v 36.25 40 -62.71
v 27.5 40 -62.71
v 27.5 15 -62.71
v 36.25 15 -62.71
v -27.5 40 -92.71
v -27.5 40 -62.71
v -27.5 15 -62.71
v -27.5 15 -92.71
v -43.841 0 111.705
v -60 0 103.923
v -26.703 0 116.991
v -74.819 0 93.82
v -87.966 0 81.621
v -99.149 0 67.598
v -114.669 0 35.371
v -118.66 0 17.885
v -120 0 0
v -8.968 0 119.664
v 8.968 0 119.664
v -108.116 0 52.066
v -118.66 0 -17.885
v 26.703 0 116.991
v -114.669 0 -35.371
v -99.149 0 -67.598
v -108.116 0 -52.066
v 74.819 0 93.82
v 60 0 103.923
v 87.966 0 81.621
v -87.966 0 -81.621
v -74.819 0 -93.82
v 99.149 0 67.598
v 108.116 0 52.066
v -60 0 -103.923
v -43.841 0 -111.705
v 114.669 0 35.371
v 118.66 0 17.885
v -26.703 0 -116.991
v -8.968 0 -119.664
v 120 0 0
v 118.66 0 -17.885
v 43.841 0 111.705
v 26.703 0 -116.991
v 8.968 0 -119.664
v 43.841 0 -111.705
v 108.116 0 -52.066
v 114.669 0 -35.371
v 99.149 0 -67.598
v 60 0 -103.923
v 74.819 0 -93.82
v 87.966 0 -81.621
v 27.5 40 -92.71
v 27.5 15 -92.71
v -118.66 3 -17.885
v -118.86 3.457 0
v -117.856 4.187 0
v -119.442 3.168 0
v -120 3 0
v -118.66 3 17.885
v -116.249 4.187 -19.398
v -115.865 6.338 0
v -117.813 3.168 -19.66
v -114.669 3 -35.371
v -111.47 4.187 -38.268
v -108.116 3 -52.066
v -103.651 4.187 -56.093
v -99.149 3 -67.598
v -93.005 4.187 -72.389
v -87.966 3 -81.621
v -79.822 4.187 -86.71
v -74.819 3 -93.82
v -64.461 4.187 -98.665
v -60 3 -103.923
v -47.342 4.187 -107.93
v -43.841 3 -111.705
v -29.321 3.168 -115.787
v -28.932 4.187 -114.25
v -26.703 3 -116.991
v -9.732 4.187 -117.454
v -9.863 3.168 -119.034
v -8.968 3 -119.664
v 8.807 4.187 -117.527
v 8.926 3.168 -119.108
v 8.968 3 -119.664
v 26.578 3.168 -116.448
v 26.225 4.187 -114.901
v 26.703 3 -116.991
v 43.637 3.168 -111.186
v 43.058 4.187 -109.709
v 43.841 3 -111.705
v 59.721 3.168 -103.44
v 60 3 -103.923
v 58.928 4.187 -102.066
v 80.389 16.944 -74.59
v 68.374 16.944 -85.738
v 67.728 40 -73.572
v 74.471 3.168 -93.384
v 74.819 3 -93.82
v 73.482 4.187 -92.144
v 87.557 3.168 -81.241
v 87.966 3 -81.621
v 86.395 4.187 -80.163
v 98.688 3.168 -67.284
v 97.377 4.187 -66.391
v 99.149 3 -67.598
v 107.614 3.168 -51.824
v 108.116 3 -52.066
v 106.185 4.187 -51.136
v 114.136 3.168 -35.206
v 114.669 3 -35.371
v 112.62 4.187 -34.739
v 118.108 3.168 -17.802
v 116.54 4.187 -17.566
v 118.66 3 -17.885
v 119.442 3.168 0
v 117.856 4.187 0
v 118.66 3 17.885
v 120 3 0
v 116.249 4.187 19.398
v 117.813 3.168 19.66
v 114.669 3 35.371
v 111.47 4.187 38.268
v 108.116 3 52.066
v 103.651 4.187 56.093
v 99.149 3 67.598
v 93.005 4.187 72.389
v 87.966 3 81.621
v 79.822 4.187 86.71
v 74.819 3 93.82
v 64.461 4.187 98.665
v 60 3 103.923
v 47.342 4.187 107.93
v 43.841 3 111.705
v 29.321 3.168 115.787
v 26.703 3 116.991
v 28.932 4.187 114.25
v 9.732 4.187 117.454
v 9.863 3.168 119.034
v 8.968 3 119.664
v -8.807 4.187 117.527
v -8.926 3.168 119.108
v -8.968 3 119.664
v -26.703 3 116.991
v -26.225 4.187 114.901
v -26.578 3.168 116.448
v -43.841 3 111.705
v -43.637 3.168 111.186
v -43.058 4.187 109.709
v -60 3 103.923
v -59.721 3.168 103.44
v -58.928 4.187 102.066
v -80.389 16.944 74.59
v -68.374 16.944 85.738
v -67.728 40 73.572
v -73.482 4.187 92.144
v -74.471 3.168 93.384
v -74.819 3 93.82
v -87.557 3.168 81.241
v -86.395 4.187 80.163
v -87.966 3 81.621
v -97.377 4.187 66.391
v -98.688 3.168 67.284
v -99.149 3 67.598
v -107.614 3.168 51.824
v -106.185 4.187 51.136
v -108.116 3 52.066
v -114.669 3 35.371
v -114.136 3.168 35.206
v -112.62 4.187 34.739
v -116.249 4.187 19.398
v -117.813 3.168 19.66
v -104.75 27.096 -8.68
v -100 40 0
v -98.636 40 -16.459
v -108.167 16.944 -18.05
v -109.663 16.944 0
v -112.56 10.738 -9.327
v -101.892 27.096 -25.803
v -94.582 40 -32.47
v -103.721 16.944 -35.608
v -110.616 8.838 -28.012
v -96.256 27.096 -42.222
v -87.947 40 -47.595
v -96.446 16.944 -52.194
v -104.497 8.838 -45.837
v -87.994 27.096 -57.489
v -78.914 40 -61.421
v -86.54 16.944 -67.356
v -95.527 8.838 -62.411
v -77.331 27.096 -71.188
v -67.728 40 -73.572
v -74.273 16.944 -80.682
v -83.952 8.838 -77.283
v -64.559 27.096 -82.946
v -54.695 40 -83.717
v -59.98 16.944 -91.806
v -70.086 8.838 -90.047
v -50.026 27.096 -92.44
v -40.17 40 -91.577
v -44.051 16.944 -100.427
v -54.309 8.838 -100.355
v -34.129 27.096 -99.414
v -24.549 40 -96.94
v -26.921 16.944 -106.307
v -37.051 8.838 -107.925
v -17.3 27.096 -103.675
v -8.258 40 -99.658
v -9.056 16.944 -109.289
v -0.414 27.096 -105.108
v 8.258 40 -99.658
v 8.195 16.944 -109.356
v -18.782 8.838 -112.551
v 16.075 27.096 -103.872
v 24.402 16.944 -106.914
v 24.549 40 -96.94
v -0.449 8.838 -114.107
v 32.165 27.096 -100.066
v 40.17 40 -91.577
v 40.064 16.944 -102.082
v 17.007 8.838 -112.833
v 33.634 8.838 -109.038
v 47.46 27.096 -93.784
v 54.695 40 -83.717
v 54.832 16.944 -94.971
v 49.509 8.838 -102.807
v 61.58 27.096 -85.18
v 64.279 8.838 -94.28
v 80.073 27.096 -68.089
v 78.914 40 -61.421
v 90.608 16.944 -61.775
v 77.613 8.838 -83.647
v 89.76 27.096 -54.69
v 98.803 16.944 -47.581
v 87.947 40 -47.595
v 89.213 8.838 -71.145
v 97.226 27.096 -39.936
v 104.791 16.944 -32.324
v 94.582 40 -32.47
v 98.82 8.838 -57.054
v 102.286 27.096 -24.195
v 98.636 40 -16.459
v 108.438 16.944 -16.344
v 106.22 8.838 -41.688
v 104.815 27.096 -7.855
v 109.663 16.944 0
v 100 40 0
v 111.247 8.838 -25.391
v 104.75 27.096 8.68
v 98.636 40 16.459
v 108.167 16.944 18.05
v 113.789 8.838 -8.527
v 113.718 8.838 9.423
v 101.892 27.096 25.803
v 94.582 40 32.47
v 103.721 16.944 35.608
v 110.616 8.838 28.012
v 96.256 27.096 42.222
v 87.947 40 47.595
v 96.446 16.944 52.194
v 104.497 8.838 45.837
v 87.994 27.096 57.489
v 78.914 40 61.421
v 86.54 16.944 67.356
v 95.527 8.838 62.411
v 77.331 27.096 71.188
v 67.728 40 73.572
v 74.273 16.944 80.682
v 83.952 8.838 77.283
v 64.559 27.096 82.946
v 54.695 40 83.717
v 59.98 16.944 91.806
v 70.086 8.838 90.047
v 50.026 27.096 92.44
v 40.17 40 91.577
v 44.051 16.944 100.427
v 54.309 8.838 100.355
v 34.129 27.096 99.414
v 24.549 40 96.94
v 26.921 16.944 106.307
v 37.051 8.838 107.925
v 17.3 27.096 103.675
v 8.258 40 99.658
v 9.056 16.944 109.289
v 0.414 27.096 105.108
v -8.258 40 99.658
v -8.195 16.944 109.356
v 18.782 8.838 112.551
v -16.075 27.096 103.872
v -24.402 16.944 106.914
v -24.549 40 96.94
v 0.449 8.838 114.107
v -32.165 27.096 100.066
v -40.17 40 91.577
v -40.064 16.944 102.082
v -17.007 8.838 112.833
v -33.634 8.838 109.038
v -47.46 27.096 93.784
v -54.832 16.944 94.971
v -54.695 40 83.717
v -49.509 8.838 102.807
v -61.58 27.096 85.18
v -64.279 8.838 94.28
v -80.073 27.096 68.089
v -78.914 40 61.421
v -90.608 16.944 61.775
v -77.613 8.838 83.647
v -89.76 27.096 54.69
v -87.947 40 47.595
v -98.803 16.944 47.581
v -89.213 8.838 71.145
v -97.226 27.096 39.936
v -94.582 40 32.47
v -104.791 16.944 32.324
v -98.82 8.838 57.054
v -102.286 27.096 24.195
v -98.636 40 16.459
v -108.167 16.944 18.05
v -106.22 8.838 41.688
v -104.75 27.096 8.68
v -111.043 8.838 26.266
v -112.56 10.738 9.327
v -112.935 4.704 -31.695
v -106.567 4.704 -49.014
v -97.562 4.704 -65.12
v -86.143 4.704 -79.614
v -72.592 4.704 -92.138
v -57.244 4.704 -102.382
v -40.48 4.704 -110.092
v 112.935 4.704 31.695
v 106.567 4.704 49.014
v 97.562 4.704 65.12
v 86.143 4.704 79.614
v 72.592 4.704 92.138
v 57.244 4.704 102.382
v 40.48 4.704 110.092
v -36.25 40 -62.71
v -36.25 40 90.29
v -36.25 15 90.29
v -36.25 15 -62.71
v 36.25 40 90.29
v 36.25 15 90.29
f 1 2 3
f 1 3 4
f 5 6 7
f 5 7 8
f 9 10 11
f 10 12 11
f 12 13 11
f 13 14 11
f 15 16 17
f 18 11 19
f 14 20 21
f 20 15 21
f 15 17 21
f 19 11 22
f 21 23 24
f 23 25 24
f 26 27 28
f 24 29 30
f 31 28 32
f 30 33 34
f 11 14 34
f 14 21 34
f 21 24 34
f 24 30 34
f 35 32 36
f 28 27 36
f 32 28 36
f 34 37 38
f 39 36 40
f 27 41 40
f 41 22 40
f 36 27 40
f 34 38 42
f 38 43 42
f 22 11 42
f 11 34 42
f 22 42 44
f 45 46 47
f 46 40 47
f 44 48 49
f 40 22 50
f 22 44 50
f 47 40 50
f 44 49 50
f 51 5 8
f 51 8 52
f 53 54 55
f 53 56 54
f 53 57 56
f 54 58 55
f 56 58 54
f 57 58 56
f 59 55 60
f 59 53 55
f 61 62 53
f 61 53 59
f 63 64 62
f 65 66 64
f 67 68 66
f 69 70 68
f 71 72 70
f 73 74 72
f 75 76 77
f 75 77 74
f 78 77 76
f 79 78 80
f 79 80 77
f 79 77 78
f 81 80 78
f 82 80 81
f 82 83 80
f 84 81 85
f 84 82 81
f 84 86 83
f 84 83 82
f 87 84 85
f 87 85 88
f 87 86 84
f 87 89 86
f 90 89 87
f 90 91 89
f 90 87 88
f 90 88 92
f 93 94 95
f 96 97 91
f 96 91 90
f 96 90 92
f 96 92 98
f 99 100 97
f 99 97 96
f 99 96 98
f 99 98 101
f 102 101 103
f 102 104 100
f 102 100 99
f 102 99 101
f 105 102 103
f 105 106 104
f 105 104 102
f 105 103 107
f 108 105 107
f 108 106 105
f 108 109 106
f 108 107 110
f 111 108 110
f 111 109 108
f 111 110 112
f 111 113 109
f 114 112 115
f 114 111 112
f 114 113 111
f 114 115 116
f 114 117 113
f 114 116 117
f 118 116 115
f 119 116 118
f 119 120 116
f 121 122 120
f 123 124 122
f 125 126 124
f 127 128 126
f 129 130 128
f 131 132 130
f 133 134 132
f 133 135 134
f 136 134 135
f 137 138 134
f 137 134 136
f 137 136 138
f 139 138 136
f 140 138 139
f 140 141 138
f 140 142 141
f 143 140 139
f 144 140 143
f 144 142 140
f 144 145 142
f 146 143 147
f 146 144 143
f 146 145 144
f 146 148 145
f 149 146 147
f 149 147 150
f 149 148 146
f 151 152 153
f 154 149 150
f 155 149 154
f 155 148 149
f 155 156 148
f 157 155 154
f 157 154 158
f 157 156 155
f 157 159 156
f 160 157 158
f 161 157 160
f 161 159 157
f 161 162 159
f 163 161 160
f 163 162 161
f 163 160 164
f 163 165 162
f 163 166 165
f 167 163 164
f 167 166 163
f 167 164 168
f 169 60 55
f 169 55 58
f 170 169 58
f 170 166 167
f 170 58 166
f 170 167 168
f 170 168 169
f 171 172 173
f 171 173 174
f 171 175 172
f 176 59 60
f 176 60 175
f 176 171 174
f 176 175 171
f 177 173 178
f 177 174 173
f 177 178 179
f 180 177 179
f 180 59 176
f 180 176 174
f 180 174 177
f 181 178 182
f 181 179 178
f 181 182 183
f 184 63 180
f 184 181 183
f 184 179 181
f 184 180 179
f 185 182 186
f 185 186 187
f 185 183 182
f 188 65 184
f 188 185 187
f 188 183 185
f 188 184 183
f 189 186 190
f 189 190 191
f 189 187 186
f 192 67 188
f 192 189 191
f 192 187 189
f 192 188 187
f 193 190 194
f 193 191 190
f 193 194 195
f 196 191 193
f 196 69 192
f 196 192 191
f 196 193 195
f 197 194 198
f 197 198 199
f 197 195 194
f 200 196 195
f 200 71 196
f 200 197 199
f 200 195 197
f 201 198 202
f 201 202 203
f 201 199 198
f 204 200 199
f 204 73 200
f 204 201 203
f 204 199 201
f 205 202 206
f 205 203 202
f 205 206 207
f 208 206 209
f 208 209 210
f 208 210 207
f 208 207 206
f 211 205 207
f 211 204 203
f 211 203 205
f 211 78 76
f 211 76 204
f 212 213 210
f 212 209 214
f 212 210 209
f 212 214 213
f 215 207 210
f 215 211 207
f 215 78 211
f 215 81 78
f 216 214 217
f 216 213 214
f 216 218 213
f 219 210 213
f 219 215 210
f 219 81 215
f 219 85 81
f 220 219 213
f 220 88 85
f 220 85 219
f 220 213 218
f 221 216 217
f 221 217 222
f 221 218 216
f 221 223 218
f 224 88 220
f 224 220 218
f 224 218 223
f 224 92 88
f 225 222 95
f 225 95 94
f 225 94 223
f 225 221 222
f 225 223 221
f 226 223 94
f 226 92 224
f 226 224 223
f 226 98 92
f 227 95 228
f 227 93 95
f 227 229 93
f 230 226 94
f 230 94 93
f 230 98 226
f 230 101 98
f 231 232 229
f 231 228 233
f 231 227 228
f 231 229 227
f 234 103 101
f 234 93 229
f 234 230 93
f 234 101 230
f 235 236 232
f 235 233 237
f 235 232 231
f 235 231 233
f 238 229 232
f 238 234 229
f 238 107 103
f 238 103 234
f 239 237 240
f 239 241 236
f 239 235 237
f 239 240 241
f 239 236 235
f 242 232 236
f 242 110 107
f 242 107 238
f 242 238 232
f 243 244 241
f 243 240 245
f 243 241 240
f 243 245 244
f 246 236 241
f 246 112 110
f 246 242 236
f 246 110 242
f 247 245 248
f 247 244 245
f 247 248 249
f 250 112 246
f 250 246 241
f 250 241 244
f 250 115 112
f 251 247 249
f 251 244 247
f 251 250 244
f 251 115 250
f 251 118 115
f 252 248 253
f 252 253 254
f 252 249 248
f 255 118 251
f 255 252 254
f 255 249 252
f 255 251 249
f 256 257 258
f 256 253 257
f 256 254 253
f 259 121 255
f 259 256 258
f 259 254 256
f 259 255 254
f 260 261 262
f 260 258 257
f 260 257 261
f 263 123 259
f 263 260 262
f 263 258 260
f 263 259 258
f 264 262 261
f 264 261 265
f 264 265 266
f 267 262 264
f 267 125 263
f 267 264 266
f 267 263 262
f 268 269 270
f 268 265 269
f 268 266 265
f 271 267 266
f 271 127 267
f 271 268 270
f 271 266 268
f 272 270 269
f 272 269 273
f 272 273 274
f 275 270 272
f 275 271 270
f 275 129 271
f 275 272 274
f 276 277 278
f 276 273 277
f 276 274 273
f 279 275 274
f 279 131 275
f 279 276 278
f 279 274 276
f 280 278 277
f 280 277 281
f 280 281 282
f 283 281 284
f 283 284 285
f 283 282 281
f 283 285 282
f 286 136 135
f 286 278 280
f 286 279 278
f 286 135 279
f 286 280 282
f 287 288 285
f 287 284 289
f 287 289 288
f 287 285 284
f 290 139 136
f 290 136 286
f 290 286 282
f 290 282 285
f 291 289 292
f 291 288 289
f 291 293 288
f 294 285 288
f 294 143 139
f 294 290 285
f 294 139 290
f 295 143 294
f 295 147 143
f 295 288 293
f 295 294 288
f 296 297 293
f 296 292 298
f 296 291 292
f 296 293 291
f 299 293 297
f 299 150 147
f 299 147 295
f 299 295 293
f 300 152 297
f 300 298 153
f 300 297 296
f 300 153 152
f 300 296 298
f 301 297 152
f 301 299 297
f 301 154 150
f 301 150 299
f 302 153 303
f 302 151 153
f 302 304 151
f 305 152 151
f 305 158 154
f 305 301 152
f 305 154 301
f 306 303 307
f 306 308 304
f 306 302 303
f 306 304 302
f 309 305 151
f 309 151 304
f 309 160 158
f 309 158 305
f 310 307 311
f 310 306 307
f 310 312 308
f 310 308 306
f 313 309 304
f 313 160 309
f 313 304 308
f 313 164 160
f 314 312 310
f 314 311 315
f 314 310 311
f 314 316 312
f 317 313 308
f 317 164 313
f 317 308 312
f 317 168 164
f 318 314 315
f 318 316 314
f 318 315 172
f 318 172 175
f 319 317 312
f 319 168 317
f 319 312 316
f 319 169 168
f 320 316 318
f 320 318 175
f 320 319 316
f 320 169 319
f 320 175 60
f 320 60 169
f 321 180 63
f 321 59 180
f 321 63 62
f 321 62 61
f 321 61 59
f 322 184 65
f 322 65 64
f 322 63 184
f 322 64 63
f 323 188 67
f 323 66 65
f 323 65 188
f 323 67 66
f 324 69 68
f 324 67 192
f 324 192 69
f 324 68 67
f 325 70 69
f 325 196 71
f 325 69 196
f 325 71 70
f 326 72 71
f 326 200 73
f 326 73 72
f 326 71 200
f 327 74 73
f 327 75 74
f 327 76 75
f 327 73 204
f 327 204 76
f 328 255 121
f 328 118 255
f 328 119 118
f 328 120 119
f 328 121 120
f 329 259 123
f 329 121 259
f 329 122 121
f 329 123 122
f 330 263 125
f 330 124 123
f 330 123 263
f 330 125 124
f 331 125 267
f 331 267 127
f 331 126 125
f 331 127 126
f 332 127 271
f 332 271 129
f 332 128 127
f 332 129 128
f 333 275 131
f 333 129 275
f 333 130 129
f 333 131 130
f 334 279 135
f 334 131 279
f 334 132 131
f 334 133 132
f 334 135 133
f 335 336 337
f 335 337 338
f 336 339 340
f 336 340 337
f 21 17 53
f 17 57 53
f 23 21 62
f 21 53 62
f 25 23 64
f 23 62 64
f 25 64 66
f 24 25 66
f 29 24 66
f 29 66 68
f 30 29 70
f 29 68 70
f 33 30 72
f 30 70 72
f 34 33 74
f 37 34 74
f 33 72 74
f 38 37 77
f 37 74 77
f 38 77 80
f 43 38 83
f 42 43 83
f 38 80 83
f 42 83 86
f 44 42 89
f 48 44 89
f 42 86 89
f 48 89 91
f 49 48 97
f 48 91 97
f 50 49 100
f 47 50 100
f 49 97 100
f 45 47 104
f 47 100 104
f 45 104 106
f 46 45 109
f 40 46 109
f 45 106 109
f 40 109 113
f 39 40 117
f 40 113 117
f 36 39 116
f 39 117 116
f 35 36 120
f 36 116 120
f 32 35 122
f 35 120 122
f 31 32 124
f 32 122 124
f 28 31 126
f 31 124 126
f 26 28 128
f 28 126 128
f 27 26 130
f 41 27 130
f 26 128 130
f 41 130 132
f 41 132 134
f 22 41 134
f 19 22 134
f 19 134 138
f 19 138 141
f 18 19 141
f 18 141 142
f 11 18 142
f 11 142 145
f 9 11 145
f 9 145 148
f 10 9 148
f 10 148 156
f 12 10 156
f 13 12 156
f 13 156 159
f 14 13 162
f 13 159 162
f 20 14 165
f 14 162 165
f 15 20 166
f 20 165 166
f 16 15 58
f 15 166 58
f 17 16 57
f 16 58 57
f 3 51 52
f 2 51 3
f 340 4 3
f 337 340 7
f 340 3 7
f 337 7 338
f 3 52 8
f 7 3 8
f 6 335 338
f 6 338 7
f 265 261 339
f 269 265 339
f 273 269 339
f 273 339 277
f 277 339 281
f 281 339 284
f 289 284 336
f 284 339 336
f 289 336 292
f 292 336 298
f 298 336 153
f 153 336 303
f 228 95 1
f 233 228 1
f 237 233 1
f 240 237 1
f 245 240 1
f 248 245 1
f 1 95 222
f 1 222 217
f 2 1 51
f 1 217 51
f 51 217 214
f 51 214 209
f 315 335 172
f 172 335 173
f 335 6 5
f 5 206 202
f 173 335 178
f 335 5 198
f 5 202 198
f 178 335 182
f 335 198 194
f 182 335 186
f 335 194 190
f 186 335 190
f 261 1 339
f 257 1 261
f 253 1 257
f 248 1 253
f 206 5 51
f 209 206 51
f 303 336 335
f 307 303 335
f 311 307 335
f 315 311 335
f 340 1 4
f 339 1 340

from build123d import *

# Parameters (mm, degrees)
CUT_EXTRUDE_1_DEPTH = 25


with BuildPart() as part:
    # 草图1 → 旋转2 (revolve)
    with BuildSketch(Plane.XY, mode=Mode.PRIVATE) as revolve_2_sk:
        with BuildLine():
            Line((0, 0), (120, 0))
            Line((120, 0), (120, 3))
            add(Edge.make_bspline(
                [(100, 40), (113.464773616, 4.300155843), (120, 3)],
                knots=[0, 0, 0, 0.922507556, 0.922507556, 0.922507556], degree=2))
            Line((100, 40), (0, 40))
            Line((0, 40), (0, 0))
        make_face()
    revolve(revolve_2_sk.sketch.rotate(Axis((0, 40, 0), (0, -1, 0)), 180), axis=Axis((0, 40, 0), (0, -1, 0)))  # turned: the seam where the file's is

    # 草图2 → 切除-拉伸1 (cut)
    with BuildSketch(Plane(origin=(0, 40, 0), x_dir=(1, 0, 0), z_dir=(0, 1, 0))):
        Polygon((36.25, -90.290489125), (-36.25, -90.290489125), (-36.25, 62.709510875), (-27.5, 62.709510875), (-27.5, 92.709510875), (27.5, 92.709510875), (27.5, 62.709510875), (36.25, 62.709510875), align=None)
    extrude(amount=-CUT_EXTRUDE_1_DEPTH, mode=Mode.SUBTRACT)


solid = part.part
